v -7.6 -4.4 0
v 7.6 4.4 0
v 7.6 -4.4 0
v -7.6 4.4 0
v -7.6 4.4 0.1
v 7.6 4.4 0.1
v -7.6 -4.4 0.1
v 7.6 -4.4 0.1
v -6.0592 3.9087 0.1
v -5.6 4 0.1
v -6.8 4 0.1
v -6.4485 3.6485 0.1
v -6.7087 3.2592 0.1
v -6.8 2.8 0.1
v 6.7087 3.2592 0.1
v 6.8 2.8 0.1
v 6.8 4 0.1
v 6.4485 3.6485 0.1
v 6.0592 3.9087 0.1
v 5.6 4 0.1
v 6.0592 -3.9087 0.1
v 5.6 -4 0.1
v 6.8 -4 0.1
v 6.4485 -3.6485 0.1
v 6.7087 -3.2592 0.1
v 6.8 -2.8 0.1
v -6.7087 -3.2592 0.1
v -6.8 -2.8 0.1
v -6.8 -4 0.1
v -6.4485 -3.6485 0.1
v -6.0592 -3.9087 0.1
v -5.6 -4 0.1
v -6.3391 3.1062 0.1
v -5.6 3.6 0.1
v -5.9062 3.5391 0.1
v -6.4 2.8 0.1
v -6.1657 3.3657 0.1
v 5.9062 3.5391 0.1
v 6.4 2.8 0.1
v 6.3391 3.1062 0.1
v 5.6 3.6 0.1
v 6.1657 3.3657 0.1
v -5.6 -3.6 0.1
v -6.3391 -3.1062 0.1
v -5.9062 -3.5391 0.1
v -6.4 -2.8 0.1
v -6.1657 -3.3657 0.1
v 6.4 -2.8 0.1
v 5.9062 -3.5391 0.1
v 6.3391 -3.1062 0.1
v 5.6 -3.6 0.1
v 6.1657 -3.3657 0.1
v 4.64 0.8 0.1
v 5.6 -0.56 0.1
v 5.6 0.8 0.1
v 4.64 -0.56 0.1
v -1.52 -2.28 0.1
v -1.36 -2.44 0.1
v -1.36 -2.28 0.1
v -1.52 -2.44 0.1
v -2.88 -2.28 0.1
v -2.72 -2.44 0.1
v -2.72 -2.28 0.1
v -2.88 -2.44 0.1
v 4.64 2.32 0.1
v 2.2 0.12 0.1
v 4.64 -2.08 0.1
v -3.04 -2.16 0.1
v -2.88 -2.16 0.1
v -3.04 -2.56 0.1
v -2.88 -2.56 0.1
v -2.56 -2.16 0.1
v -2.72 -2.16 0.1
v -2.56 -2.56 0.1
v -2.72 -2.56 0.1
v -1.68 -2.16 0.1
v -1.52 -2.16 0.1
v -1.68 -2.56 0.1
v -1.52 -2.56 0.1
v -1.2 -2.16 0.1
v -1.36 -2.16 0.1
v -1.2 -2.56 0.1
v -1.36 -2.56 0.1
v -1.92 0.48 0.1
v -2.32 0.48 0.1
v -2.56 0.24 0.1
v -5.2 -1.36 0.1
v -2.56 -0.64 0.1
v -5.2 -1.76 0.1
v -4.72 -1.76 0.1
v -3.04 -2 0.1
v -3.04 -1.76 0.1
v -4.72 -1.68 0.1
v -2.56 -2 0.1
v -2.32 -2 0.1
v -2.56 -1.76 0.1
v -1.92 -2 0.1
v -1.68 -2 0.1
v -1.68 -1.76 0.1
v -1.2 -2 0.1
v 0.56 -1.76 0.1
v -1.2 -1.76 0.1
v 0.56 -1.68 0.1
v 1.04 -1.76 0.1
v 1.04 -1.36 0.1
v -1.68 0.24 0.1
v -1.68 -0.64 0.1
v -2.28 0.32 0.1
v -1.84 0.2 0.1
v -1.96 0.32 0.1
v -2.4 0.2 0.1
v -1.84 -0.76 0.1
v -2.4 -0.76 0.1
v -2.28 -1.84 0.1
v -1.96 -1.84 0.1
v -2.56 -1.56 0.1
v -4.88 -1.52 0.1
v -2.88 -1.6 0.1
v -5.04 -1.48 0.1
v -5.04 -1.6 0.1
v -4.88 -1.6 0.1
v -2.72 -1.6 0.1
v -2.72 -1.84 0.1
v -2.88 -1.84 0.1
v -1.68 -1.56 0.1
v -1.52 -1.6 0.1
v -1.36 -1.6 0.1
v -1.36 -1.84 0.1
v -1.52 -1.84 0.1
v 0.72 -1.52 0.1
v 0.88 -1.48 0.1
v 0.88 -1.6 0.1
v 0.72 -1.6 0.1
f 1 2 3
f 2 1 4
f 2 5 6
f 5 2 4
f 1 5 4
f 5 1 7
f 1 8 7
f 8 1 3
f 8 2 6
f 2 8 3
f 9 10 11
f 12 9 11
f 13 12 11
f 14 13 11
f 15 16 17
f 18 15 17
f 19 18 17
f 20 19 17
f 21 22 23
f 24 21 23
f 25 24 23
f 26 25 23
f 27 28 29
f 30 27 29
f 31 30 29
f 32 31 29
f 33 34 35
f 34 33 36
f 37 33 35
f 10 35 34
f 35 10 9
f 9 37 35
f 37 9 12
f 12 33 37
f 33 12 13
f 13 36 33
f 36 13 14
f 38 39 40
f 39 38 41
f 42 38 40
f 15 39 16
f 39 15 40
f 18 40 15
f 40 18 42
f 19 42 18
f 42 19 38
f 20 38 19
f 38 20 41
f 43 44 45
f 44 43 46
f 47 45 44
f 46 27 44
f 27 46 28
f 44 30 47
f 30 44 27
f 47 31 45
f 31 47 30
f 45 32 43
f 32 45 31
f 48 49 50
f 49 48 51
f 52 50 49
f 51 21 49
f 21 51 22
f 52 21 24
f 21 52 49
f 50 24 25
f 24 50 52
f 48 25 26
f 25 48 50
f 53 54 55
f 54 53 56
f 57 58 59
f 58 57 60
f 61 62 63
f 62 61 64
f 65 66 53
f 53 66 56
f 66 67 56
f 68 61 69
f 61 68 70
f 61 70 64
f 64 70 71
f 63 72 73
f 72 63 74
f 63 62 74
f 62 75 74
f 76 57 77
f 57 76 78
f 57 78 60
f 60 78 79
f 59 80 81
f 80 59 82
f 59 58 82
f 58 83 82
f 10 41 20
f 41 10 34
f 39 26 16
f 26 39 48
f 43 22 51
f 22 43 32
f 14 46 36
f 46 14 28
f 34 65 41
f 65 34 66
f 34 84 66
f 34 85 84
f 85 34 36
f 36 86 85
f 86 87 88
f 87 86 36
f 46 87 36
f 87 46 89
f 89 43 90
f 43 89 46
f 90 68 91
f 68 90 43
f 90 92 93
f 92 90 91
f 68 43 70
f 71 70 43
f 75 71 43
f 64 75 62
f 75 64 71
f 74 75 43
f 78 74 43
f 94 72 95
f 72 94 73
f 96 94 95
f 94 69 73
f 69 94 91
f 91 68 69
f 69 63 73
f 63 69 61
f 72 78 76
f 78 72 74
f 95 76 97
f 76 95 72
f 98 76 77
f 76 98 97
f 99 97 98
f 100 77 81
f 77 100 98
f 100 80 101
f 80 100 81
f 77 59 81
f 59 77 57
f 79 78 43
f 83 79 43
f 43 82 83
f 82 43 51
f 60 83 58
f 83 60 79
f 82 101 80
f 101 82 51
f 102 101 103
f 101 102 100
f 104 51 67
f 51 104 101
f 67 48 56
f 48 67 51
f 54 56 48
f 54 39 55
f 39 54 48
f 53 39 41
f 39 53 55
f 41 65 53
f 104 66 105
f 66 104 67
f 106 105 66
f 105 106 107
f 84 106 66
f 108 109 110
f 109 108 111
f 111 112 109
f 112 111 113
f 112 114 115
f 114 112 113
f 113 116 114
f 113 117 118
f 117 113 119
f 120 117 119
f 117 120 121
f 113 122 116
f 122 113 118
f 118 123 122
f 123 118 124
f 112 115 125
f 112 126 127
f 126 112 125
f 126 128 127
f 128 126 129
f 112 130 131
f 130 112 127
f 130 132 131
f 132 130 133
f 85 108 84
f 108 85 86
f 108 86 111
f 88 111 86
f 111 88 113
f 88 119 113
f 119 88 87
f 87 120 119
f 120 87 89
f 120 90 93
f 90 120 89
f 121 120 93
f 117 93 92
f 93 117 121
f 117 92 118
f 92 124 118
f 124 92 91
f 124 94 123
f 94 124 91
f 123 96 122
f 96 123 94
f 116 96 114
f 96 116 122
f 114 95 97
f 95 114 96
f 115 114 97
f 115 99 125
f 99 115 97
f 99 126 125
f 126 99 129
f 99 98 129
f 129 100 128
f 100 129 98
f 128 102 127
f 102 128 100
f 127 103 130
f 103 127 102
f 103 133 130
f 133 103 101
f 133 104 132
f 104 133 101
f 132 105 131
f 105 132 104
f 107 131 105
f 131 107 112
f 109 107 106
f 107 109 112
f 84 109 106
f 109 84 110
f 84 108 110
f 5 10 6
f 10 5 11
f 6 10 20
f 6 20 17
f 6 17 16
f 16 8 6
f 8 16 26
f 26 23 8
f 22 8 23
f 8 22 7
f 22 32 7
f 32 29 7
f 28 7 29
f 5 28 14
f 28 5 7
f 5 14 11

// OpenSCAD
// file: ../p/box5-12.scad
use <../lib.scad>
function ldraw_lib__box5_12() = [
// 0 Box with 5 Faces without Any Edges
// 0 Name: box5-12.dat
// 0 Author: Chris Dee [cwdee]
// 0 !LDRAW_ORG Primitive UPDATE 2009-02
// 0 !LICENSE Licensed under CC BY 2.0 and CC BY 4.0 : see CAreadme.txt
// 
// 0 BFC CERTIFY CCW
  [0,"BFC","CERTIFY"],
  [0,"BFC","CCW"],
// 
// 0 !HISTORY 2009-09-03 [PTadmin] Official Update 2009-02
// 
// 
// 4 16 1 1 1 1 1 -1 -1 1 -1 -1 1 1
  [4,16,1,1,1,1,1,-1,-1,1,-1,-1,1,1],
// 4 16 -1 0 1 1 0 1 1 1 1 -1 1 1
  [4,16,-1,0,1,1,0,1,1,1,1,-1,1,1],
// 4 16 -1 0 -1 -1 0 1 -1 1 1 -1 1 -1
  [4,16,-1,0,-1,-1,0,1,-1,1,1,-1,1,-1],
// 4 16 1 0 -1 -1 0 -1 -1 1 -1 1 1 -1
  [4,16,1,0,-1,-1,0,-1,-1,1,-1,1,1,-1],
// 4 16 1 0 1 1 0 -1 1 1 -1 1 1 1
  [4,16,1,0,1,1,0,-1,1,1,-1,1,1,1],
// 0
];
makepoly(ldraw_lib__box5_12(), line=0.2);
// file: ../p/1-4ring2.scad
use <../lib.scad>
function ldraw_lib__1_4ring2() = [
// 0 Ring  2 x 0.25
// 0 Name: 1-4ring2.dat
// 0 Author: Franklin W. Cain [fwcain]
// 0 !LDRAW_ORG Primitive UPDATE 2015-01
// 0 !LICENSE Licensed under CC BY 2.0 and CC BY 4.0 : see CAreadme.txt
// 
// 0 BFC CERTIFY CCW
  [0,"BFC","CERTIFY"],
  [0,"BFC","CCW"],
// 
// 0 !HISTORY 2001-12-31 [PTadmin] Official Update 2001-03
// 0 !HISTORY 2007-06-22 [PTadmin] Header formatted for Contributor Agreement
// 0 !HISTORY 2008-07-01 [PTadmin] Official Update 2008-01
// 0 !HISTORY 2012-02-16 [Philo] Changed to CCW
// 0 !HISTORY 2012-03-30 [PTadmin] Official Update 2012-01
// 0 !HISTORY 2014-12-25 [MMR1988] Fixed a rounding issue
// 0 !HISTORY 2015-10-11 [PTadmin] Official Update 2015-01
// 
// 
// 4 16 3 0 0 2.7717 0 1.1481 1.8478 0 0.7654 2 0 0
  [4,16,3,0,0,2.7717,0,1.1481,1.8478,0,0.7654,2,0,0],
// 4 16 2.7717 0 1.1481 2.1213 0 2.1213 1.4142 0 1.4142 1.8478 0 0.7654
  [4,16,2.7717,0,1.1481,2.1213,0,2.1213,1.4142,0,1.4142,1.8478,0,0.7654],
// 4 16 2.1213 0 2.1213 1.1481 0 2.7717 0.7654 0 1.8478 1.4142 0 1.4142
  [4,16,2.1213,0,2.1213,1.1481,0,2.7717,0.7654,0,1.8478,1.4142,0,1.4142],
// 4 16 1.1481 0 2.7717 0 0 3 0 0 2 0.7654 0 1.8478
  [4,16,1.1481,0,2.7717,0,0,3,0,0,2,0.7654,0,1.8478],
// 0 // Build by Primitive Generator 2
];
makepoly(ldraw_lib__1_4ring2(), line=0.2);
// file: ../p/1-4ndis.scad
use <../lib.scad>
function ldraw_lib__1_4ndis() = [
// 0 Disc Negative 0.25
// 0 Name: 1-4ndis.dat
// 0 Author: James Jessiman
// 0 !LDRAW_ORG Primitive UPDATE 2012-01
// 0 !LICENSE Licensed under CC BY 2.0 and CC BY 4.0 : see CAreadme.txt
// 
// 0 BFC CERTIFY CCW
  [0,"BFC","CERTIFY"],
  [0,"BFC","CCW"],
// 
// 0 !HISTORY 2002-03-23 [sbliss] Added BFC Statement
// 0 !HISTORY 2002-04-25 [PTadmin] Official Update 2002-02
// 0 !HISTORY 2007-06-22 [PTadmin] Header formatted for Contributor Agreement
// 0 !HISTORY 2008-07-01 [PTadmin] Official Update 2008-01
// 0 !HISTORY 2012-02-16 [Philo] Changed to CCW
// 0 !HISTORY 2012-03-30 [PTadmin] Official Update 2012-01
// 
// 
// 3 16 0.9239 0 0.3827 1 0 0 1 0 1
  [3,16,0.9239,0,0.3827,1,0,0,1,0,1],
// 3 16 0.7071 0 0.7071 0.9239 0 0.3827 1 0 1
  [3,16,0.7071,0,0.7071,0.9239,0,0.3827,1,0,1],
// 3 16 0.3827 0 0.9239 0.7071 0 0.7071 1 0 1
  [3,16,0.3827,0,0.9239,0.7071,0,0.7071,1,0,1],
// 3 16 0 0 1 0.3827 0 0.9239 1 0 1
  [3,16,0,0,1,0.3827,0,0.9239,1,0,1],
];
makepoly(ldraw_lib__1_4ndis(), line=0.2);
// file: ../p/1-4chrd.scad
use <../lib.scad>
function ldraw_lib__1_4chrd() = [
// 0 Chord 0.25
// 0 Name: 1-4chrd.dat
// 0 Author: Tony Hafner [hafhead]
// 0 !LDRAW_ORG Primitive UPDATE 2012-02
// 0 !LICENSE Licensed under CC BY 2.0 and CC BY 4.0 : see CAreadme.txt
// 
// 0 BFC CERTIFY CCW
  [0,"BFC","CERTIFY"],
  [0,"BFC","CCW"],
// 
// 0 !HISTORY 2004-04-22 [PTadmin] Official Update 2004-02
// 0 !HISTORY 2007-10-09 [PTadmin] Header formatted for Contributor Agreement
// 0 !HISTORY 2008-07-01 [PTadmin] Official Update 2008-01
// 0 !HISTORY 2012-08-02 [MMR1988] Re-creation with PrimGen2 and Rectifier
// 0 !HISTORY 2012-08-09 [PTadmin] Official Update 2012-02
// 
// 
// 4 16 0.9239 0 0.3827 0.3827 0 0.9239 0 0 1 1 0 0
  [4,16,0.9239,0,0.3827,0.3827,0,0.9239,0,0,1,1,0,0],
// 3 16 0.7071 0 0.7071 0.3827 0 0.9239 0.9239 0 0.3827
  [3,16,0.7071,0,0.7071,0.3827,0,0.9239,0.9239,0,0.3827],
];
makepoly(ldraw_lib__1_4chrd(), line=0.2);
// main file
use <../lib.scad>
use <../p/1-4chrd.scad>
use <../p/1-4ndis.scad>
use <../p/1-4ring2.scad>
use <../p/box5-12.scad>
function ldraw_lib__163555j() = [
// 0 Sticker  1.1 x  1.9 with Airport Direction Sign - Left
// 0 Name: 163555j.dat
// 0 Author: Takeshi Takahashi [RainbowDolphin]
// 0 !LDRAW_ORG Part UPDATE 2022-05
// 0 !LICENSE Licensed under CC BY 2.0 and CC BY 4.0 : see CAreadme.txt
// 
// 0 BFC CERTIFY CCW
  [0,"BFC","CERTIFY"],
  [0,"BFC","CCW"],
// 
// 0 !KEYWORDS Bricklink 6399stk01, Brickowl 458337, Monorail, Rebrickable 163555
// 0 !KEYWORDS set 6399, Station
// 
// 0 !HISTORY 2022-09-15 [PTadmin] Official Update 2022-05
// 
// 
// 1 16 0 -0.25 0 19 0 0 0 0.25 0 0 0 11 box5-12.dat
  [1,16,0,-0.25,0,19,0,0,0,0.25,0,0,0,11, ldraw_lib__box5_12()],
// 1 16 -14 -.25 7 0 0 -3 0 1 0 3 0 0 1-4ndis.dat
  [1,16,-14,-.25,7,0,0,-3,0,1,0,3,0,0, ldraw_lib__1_4ndis()],
// 1 16 14 -.25 7 3 0 0 0 1 0 0 0 3 1-4ndis.dat
  [1,16,14,-.25,7,3,0,0,0,1,0,0,0,3, ldraw_lib__1_4ndis()],
// 1 16 14 -.25 -7 0 0 3 0 1 0 -3 0 0 1-4ndis.dat
  [1,16,14,-.25,-7,0,0,3,0,1,0,-3,0,0, ldraw_lib__1_4ndis()],
// 1 16 -14 -.25 -7 -3 0 0 0 1 0 0 0 -3 1-4ndis.dat
  [1,16,-14,-.25,-7,-3,0,0,0,1,0,0,0,-3, ldraw_lib__1_4ndis()],
// 0 BFC NOCLIP
  [0,"BFC","NOCLIP"],
// 1 15 -14 -.25 7 0 0 -2 0 1 0 2 0 0 1-4chrd.dat
  [1,15,-14,-.25,7,0,0,-2,0,1,0,2,0,0, ldraw_lib__1_4chrd()],
// 1 0 -14 -.25 7 0 0 -1 0 1 0 1 0 0 1-4ring2.dat
  [1,0,-14,-.25,7,0,0,-1,0,1,0,1,0,0, ldraw_lib__1_4ring2()],
// 1 15 14 -.25 7 2 0 0 0 1 0 0 0 2 1-4chrd.dat
  [1,15,14,-.25,7,2,0,0,0,1,0,0,0,2, ldraw_lib__1_4chrd()],
// 1 0 14 -.25 7 1 0 0 0 1 0 0 0 1 1-4ring2.dat
  [1,0,14,-.25,7,1,0,0,0,1,0,0,0,1, ldraw_lib__1_4ring2()],
// 1 15 -14 -.25 -7 -2 0 0 0 1 0 0 0 -2 1-4chrd.dat
  [1,15,-14,-.25,-7,-2,0,0,0,1,0,0,0,-2, ldraw_lib__1_4chrd()],
// 1 0 -14 -.25 -7 -1 0 0 0 1 0 0 0 -1 1-4ring2.dat
  [1,0,-14,-.25,-7,-1,0,0,0,1,0,0,0,-1, ldraw_lib__1_4ring2()],
// 1 15 14 -.25 -7 0 0 2 0 1 0 -2 0 0 1-4chrd.dat
  [1,15,14,-.25,-7,0,0,2,0,1,0,-2,0,0, ldraw_lib__1_4chrd()],
// 1 0 14 -.25 -7 0 0 1 0 1 0 -1 0 0 1-4ring2.dat
  [1,0,14,-.25,-7,0,0,1,0,1,0,-1,0,0, ldraw_lib__1_4ring2()],
// 4 4 14 -.25 -1.4 14 -.25 2 11.6 -.25 2 11.6 -.25 -1.4
  [4,4,14,-.25,-1.4,14,-.25,2,11.6,-.25,2,11.6,-.25,-1.4],
// 4 0 -3.4 -.25 -6.1 -3.4 -.25 -5.7 -3.8 -.25 -5.7 -3.8 -.25 -6.1
  [4,0,-3.4,-.25,-6.1,-3.4,-.25,-5.7,-3.8,-.25,-5.7,-3.8,-.25,-6.1],
// 4 0 -6.8 -.25 -6.1 -6.8 -.25 -5.7 -7.2 -.25 -5.7 -7.2 -.25 -6.1
  [4,0,-6.8,-.25,-6.1,-6.8,-.25,-5.7,-7.2,-.25,-5.7,-7.2,-.25,-6.1],
// 3 4 11.6 -.25 5.8 5.5 -.25 .3 11.6 -.25 2
  [3,4,11.6,-.25,5.8,5.5,-.25,.3,11.6,-.25,2],
// 3 4 11.6 -.25 2 5.5 -.25 .3 11.6 -.25 -1.4
  [3,4,11.6,-.25,2,5.5,-.25,.3,11.6,-.25,-1.4],
// 3 4 5.5 -.25 .3 11.6 -.25 -5.2 11.6 -.25 -1.4
  [3,4,5.5,-.25,.3,11.6,-.25,-5.2,11.6,-.25,-1.4],
// 4 0 -7.2 -.25 -5.7 -7.2 -.25 -5.4 -7.6 -.25 -5.4 -7.6 -.25 -6.4
  [4,0,-7.2,-.25,-5.7,-7.2,-.25,-5.4,-7.6,-.25,-5.4,-7.6,-.25,-6.4],
// 3 0 -7.2 -.25 -5.7 -7.6 -.25 -6.4 -7.2 -.25 -6.1
  [3,0,-7.2,-.25,-5.7,-7.6,-.25,-6.4,-7.2,-.25,-6.1],
// 3 0 -7.2 -.25 -6.1 -7.6 -.25 -6.4 -7.2 -.25 -6.4
  [3,0,-7.2,-.25,-6.1,-7.6,-.25,-6.4,-7.2,-.25,-6.4],
// 4 0 -6.4 -.25 -5.4 -6.8 -.25 -5.4 -6.8 -.25 -5.7 -6.4 -.25 -6.4
  [4,0,-6.4,-.25,-5.4,-6.8,-.25,-5.4,-6.8,-.25,-5.7,-6.4,-.25,-6.4],
// 3 0 -6.8 -.25 -5.7 -6.8 -.25 -6.1 -6.4 -.25 -6.4
  [3,0,-6.8,-.25,-5.7,-6.8,-.25,-6.1,-6.4,-.25,-6.4],
// 3 0 -6.8 -.25 -6.1 -6.8 -.25 -6.4 -6.4 -.25 -6.4
  [3,0,-6.8,-.25,-6.1,-6.8,-.25,-6.4,-6.4,-.25,-6.4],
// 4 0 -3.8 -.25 -5.7 -3.8 -.25 -5.4 -4.2 -.25 -5.4 -4.2 -.25 -6.4
  [4,0,-3.8,-.25,-5.7,-3.8,-.25,-5.4,-4.2,-.25,-5.4,-4.2,-.25,-6.4],
// 3 0 -3.8 -.25 -5.7 -4.2 -.25 -6.4 -3.8 -.25 -6.1
  [3,0,-3.8,-.25,-5.7,-4.2,-.25,-6.4,-3.8,-.25,-6.1],
// 3 0 -3.8 -.25 -6.1 -4.2 -.25 -6.4 -3.8 -.25 -6.4
  [3,0,-3.8,-.25,-6.1,-4.2,-.25,-6.4,-3.8,-.25,-6.4],
// 4 0 -3 -.25 -5.4 -3.4 -.25 -5.4 -3.4 -.25 -5.7 -3 -.25 -6.4
  [4,0,-3,-.25,-5.4,-3.4,-.25,-5.4,-3.4,-.25,-5.7,-3,-.25,-6.4],
// 3 0 -3.4 -.25 -5.7 -3.4 -.25 -6.1 -3 -.25 -6.4
  [3,0,-3.4,-.25,-5.7,-3.4,-.25,-6.1,-3,-.25,-6.4],
// 3 0 -3.4 -.25 -6.1 -3.4 -.25 -6.4 -3 -.25 -6.4
  [3,0,-3.4,-.25,-6.1,-3.4,-.25,-6.4,-3,-.25,-6.4],
// 4 0 14 -.25 10 -14 -.25 10 -14 -.25 9 14 -.25 9
  [4,0,14,-.25,10,-14,-.25,10,-14,-.25,9,14,-.25,9],
// 4 0 17 -.25 7 16 -.25 7 16 -.25 -7 17 -.25 -7
  [4,0,17,-.25,7,16,-.25,7,16,-.25,-7,17,-.25,-7],
// 4 0 14 -.25 -9 -14 -.25 -9 -14 -.25 -10 14 -.25 -10
  [4,0,14,-.25,-9,-14,-.25,-9,-14,-.25,-10,14,-.25,-10],
// 4 0 -16 -.25 7 -17 -.25 7 -17 -.25 -7 -16 -.25 -7
  [4,0,-16,-.25,7,-17,-.25,7,-17,-.25,-7,-16,-.25,-7],
// 4 15 11.6 -.25 5.8 14 -.25 9 -14 -.25 9 5.5 -.25 .3
  [4,15,11.6,-.25,5.8,14,-.25,9,-14,-.25,9,5.5,-.25,.3],
// 3 15 -14 -.25 9 -4.8 -.25 1.2 5.5 -.25 .3
  [3,15,-14,-.25,9,-4.8,-.25,1.2,5.5,-.25,.3],
// 4 15 -5.8 -.25 1.2 -4.8 -.25 1.2 -14 -.25 9 -16 -.25 7
  [4,15,-5.8,-.25,1.2,-4.8,-.25,1.2,-14,-.25,9,-16,-.25,7],
// 3 15 -16 -.25 7 -6.4 -.25 .6 -5.8 -.25 1.2
  [3,15,-16,-.25,7,-6.4,-.25,.6,-5.8,-.25,1.2],
// 4 15 -6.4 -.25 -1.6 -6.4 -.25 .6 -16 -.25 7 -13 -.25 -3.4
  [4,15,-6.4,-.25,-1.6,-6.4,-.25,.6,-16,-.25,7,-13,-.25,-3.4],
// 4 15 -13 -.25 -3.4 -16 -.25 7 -16 -.25 -7 -13 -.25 -4.4
  [4,15,-13,-.25,-3.4,-16,-.25,7,-16,-.25,-7,-13,-.25,-4.4],
// 4 15 -13 -.25 -4.4 -16 -.25 -7 -14 -.25 -9 -11.8 -.25 -4.4
  [4,15,-13,-.25,-4.4,-16,-.25,-7,-14,-.25,-9,-11.8,-.25,-4.4],
// 4 15 -7.6 -.25 -5 -11.8 -.25 -4.4 -14 -.25 -9 -7.6 -.25 -5.4
  [4,15,-7.6,-.25,-5,-11.8,-.25,-4.4,-14,-.25,-9,-7.6,-.25,-5.4],
// 4 15 -11.8 -.25 -4.2 -11.8 -.25 -4.4 -7.6 -.25 -5 -7.6 -.25 -4.4
  [4,15,-11.8,-.25,-4.2,-11.8,-.25,-4.4,-7.6,-.25,-5,-7.6,-.25,-4.4],
// 3 15 -7.6 -.25 -5.4 -14 -.25 -9 -7.6 -.25 -6.4
  [3,15,-7.6,-.25,-5.4,-14,-.25,-9,-7.6,-.25,-6.4],
// 3 15 -7.2 -.25 -6.4 -7.6 -.25 -6.4 -14 -.25 -9
  [3,15,-7.2,-.25,-6.4,-7.6,-.25,-6.4,-14,-.25,-9],
// 3 15 -6.8 -.25 -6.4 -7.2 -.25 -6.4 -14 -.25 -9
  [3,15,-6.8,-.25,-6.4,-7.2,-.25,-6.4,-14,-.25,-9],
// 4 15 -7.2 -.25 -6.1 -7.2 -.25 -6.4 -6.8 -.25 -6.4 -6.8 -.25 -6.1
  [4,15,-7.2,-.25,-6.1,-7.2,-.25,-6.4,-6.8,-.25,-6.4,-6.8,-.25,-6.1],
// 3 15 -6.4 -.25 -6.4 -6.8 -.25 -6.4 -14 -.25 -9
  [3,15,-6.4,-.25,-6.4,-6.8,-.25,-6.4,-14,-.25,-9],
// 3 15 -4.2 -.25 -6.4 -6.4 -.25 -6.4 -14 -.25 -9
  [3,15,-4.2,-.25,-6.4,-6.4,-.25,-6.4,-14,-.25,-9],
// 4 15 -6.4 -.25 -5.4 -5.8 -.25 -5 -6.4 -.25 -5 -6.8 -.25 -5.4
  [4,15,-6.4,-.25,-5.4,-5.8,-.25,-5,-6.4,-.25,-5,-6.8,-.25,-5.4],
// 3 15 -6.4 -.25 -4.4 -6.4 -.25 -5 -5.8 -.25 -5
  [3,15,-6.4,-.25,-4.4,-6.4,-.25,-5,-5.8,-.25,-5],
// 4 15 -7.2 -.25 -5.4 -6.8 -.25 -5.4 -6.4 -.25 -5 -7.6 -.25 -5
  [4,15,-7.2,-.25,-5.4,-6.8,-.25,-5.4,-6.4,-.25,-5,-7.6,-.25,-5],
// 3 15 -7.6 -.25 -5 -7.6 -.25 -5.4 -7.2 -.25 -5.4
  [3,15,-7.6,-.25,-5,-7.6,-.25,-5.4,-7.2,-.25,-5.4],
// 4 15 -6.8 -.25 -5.4 -7.2 -.25 -5.4 -7.2 -.25 -5.7 -6.8 -.25 -5.7
  [4,15,-6.8,-.25,-5.4,-7.2,-.25,-5.4,-7.2,-.25,-5.7,-6.8,-.25,-5.7],
// 4 15 -6.4 -.25 -5.4 -6.4 -.25 -6.4 -4.2 -.25 -6.4 -4.2 -.25 -5.4
  [4,15,-6.4,-.25,-5.4,-6.4,-.25,-6.4,-4.2,-.25,-6.4,-4.2,-.25,-5.4],
// 4 15 -5.8 -.25 -5 -6.4 -.25 -5.4 -4.2 -.25 -5.4 -4.8 -.25 -5
  [4,15,-5.8,-.25,-5,-6.4,-.25,-5.4,-4.2,-.25,-5.4,-4.8,-.25,-5],
// 4 15 -4.2 -.25 -5 -4.8 -.25 -5 -4.2 -.25 -5.4 -3.8 -.25 -5.4
  [4,15,-4.2,-.25,-5,-4.8,-.25,-5,-4.2,-.25,-5.4,-3.8,-.25,-5.4],
// 3 15 -4.2 -.25 -4.4 -4.8 -.25 -5 -4.2 -.25 -5
  [3,15,-4.2,-.25,-4.4,-4.8,-.25,-5,-4.2,-.25,-5],
// 4 15 -4.2 -.25 -5 -3.8 -.25 -5.4 -3.4 -.25 -5.4 -3 -.25 -5
  [4,15,-4.2,-.25,-5,-3.8,-.25,-5.4,-3.4,-.25,-5.4,-3,-.25,-5],
// 4 15 -3 -.25 -5 -3.4 -.25 -5.4 -3 -.25 -5.4 1.4 -.25 -4.4
  [4,15,-3,-.25,-5,-3.4,-.25,-5.4,-3,-.25,-5.4,1.4,-.25,-4.4],
// 4 15 -3.4 -.25 -5.4 -3.8 -.25 -5.4 -3.8 -.25 -5.7 -3.4 -.25 -5.7
  [4,15,-3.4,-.25,-5.4,-3.8,-.25,-5.4,-3.8,-.25,-5.7,-3.4,-.25,-5.7],
// 3 15 -3.8 -.25 -6.4 -4.2 -.25 -6.4 -14 -.25 -9
  [3,15,-3.8,-.25,-6.4,-4.2,-.25,-6.4,-14,-.25,-9],
// 3 15 -3.4 -.25 -6.4 -3.8 -.25 -6.4 -14 -.25 -9
  [3,15,-3.4,-.25,-6.4,-3.8,-.25,-6.4,-14,-.25,-9],
// 4 15 -3 -.25 -6.4 -3.4 -.25 -6.4 -14 -.25 -9 14 -.25 -9
  [4,15,-3,-.25,-6.4,-3.4,-.25,-6.4,-14,-.25,-9,14,-.25,-9],
// 4 15 -3.8 -.25 -6.1 -3.8 -.25 -6.4 -3.4 -.25 -6.4 -3.4 -.25 -6.1
  [4,15,-3.8,-.25,-6.1,-3.8,-.25,-6.4,-3.4,-.25,-6.4,-3.4,-.25,-6.1],
// 4 15 -3 -.25 -5.4 -3 -.25 -6.4 14 -.25 -9 1.4 -.25 -4.4
  [4,15,-3,-.25,-5.4,-3,-.25,-6.4,14,-.25,-9,1.4,-.25,-4.4],
// 4 15 -3 -.25 -5 1.4 -.25 -4.4 1.4 -.25 -4.2 -3 -.25 -4.4
  [4,15,-3,-.25,-5,1.4,-.25,-4.4,1.4,-.25,-4.2,-3,-.25,-4.4],
// 4 15 2.6 -.25 -4.4 1.4 -.25 -4.4 14 -.25 -9 11.6 -.25 -5.2
  [4,15,2.6,-.25,-4.4,1.4,-.25,-4.4,14,-.25,-9,11.6,-.25,-5.2],
// 4 15 11.6 -.25 -5.2 14 -.25 -9 16 -.25 -7 11.6 -.25 -1.4
  [4,15,11.6,-.25,-5.2,14,-.25,-9,16,-.25,-7,11.6,-.25,-1.4],
// 3 15 14 -.25 -1.4 11.6 -.25 -1.4 16 -.25 -7
  [3,15,14,-.25,-1.4,11.6,-.25,-1.4,16,-.25,-7],
// 4 15 14 -.25 2 14 -.25 -1.4 16 -.25 -7 16 -.25 7
  [4,15,14,-.25,2,14,-.25,-1.4,16,-.25,-7,16,-.25,7],
// 4 15 11.6 -.25 2 14 -.25 2 16 -.25 7 14 -.25 9
  [4,15,11.6,-.25,2,14,-.25,2,16,-.25,7,14,-.25,9],
// 3 15 14 -.25 9 11.6 -.25 5.8 11.6 -.25 2
  [3,15,14,-.25,9,11.6,-.25,5.8,11.6,-.25,2],
// 4 15 2.6 -.25 -3.4 2.6 -.25 -4.4 11.6 -.25 -5.2 5.5 -.25 .3
  [4,15,2.6,-.25,-3.4,2.6,-.25,-4.4,11.6,-.25,-5.2,5.5,-.25,.3],
// 4 15 -4.2 -.25 -1.6 2.6 -.25 -3.4 5.5 -.25 .3 -4.2 -.25 .6
  [4,15,-4.2,-.25,-1.6,2.6,-.25,-3.4,5.5,-.25,.3,-4.2,-.25,.6],
// 3 15 -4.8 -.25 1.2 -4.2 -.25 .6 5.5 -.25 .3
  [3,15,-4.8,-.25,1.2,-4.2,-.25,.6,5.5,-.25,.3],
// 4 15 -4.9 -.25 .8 -5.7 -.25 .8 -6 -.25 .5 -4.6 -.25 .5
  [4,15,-4.9,-.25,.8,-5.7,-.25,.8,-6,-.25,.5,-4.6,-.25,.5],
// 4 15 -4.6 -.25 .5 -6 -.25 .5 -6 -.25 -1.9 -4.6 -.25 -1.9
  [4,15,-4.6,-.25,.5,-6,-.25,.5,-6,-.25,-1.9,-4.6,-.25,-1.9],
// 4 15 -4.6 -.25 -1.9 -6 -.25 -1.9 -5.7 -.25 -4.6 -4.9 -.25 -4.6
  [4,15,-4.6,-.25,-1.9,-6,-.25,-1.9,-5.7,-.25,-4.6,-4.9,-.25,-4.6],
// 3 15 -6 -.25 -1.9 -6.4 -.25 -3.9 -5.7 -.25 -4.6
  [3,15,-6,-.25,-1.9,-6.4,-.25,-3.9,-5.7,-.25,-4.6],
// 4 15 -12.2 -.25 -3.8 -7.2 -.25 -4 -6 -.25 -1.9 -12.6 -.25 -3.7
  [4,15,-12.2,-.25,-3.8,-7.2,-.25,-4,-6,-.25,-1.9,-12.6,-.25,-3.7],
// 4 15 -12.2 -.25 -3.8 -12.6 -.25 -3.7 -12.6 -.25 -4 -12.2 -.25 -4
  [4,15,-12.2,-.25,-3.8,-12.6,-.25,-3.7,-12.6,-.25,-4,-12.2,-.25,-4],
// 4 15 -6 -.25 -1.9 -7.2 -.25 -4 -6.8 -.25 -4 -6.4 -.25 -3.9
  [4,15,-6,-.25,-1.9,-7.2,-.25,-4,-6.8,-.25,-4,-6.4,-.25,-3.9],
// 4 15 -6.8 -.25 -4 -7.2 -.25 -4 -7.2 -.25 -4.6 -6.8 -.25 -4.6
  [4,15,-6.8,-.25,-4,-7.2,-.25,-4,-7.2,-.25,-4.6,-6.8,-.25,-4.6],
// 3 15 -4.6 -.25 -1.9 -4.9 -.25 -4.6 -4.2 -.25 -3.9
  [3,15,-4.6,-.25,-1.9,-4.9,-.25,-4.6,-4.2,-.25,-3.9],
// 4 15 -4.6 -.25 -1.9 -4.2 -.25 -3.9 -3.8 -.25 -4 -3.4 -.25 -4
  [4,15,-4.6,-.25,-1.9,-4.2,-.25,-3.9,-3.8,-.25,-4,-3.4,-.25,-4],
// 4 15 -3.4 -.25 -4 -3.8 -.25 -4 -3.8 -.25 -4.6 -3.4 -.25 -4.6
  [4,15,-3.4,-.25,-4,-3.8,-.25,-4,-3.8,-.25,-4.6,-3.4,-.25,-4.6],
// 4 15 -4.6 -.25 -1.9 -3.4 -.25 -4 1.8 -.25 -3.8 2.2 -.25 -3.7
  [4,15,-4.6,-.25,-1.9,-3.4,-.25,-4,1.8,-.25,-3.8,2.2,-.25,-3.7],
// 4 15 2.2 -.25 -3.7 1.8 -.25 -3.8 1.8 -.25 -4 2.2 -.25 -4
  [4,15,2.2,-.25,-3.7,1.8,-.25,-3.8,1.8,-.25,-4,2.2,-.25,-4],
// 4 0 -5.7 -.25 .8 -4.8 -.25 1.2 -5.8 -.25 1.2 -6.4 -.25 .6
  [4,0,-5.7,-.25,.8,-4.8,-.25,1.2,-5.8,-.25,1.2,-6.4,-.25,.6],
// 3 0 -5.7 -.25 .8 -6.4 -.25 .6 -6 -.25 .5
  [3,0,-5.7,-.25,.8,-6.4,-.25,.6,-6,-.25,.5],
// 4 0 -6 -.25 .5 -6.4 -.25 .6 -6.4 -.25 -1.6 -6 -.25 -1.9
  [4,0,-6,-.25,.5,-6.4,-.25,.6,-6.4,-.25,-1.6,-6,-.25,-1.9],
// 4 0 -12.6 -.25 -3.7 -6 -.25 -1.9 -6.4 -.25 -1.6 -13 -.25 -3.4
  [4,0,-12.6,-.25,-3.7,-6,-.25,-1.9,-6.4,-.25,-1.6,-13,-.25,-3.4],
// 4 0 -12.6 -.25 -3.7 -13 -.25 -3.4 -13 -.25 -4.4 -12.6 -.25 -4
  [4,0,-12.6,-.25,-3.7,-13,-.25,-3.4,-13,-.25,-4.4,-12.6,-.25,-4],
// 4 0 -12.6 -.25 -4 -13 -.25 -4.4 -11.8 -.25 -4.4 -11.8 -.25 -4.2
  [4,0,-12.6,-.25,-4,-13,-.25,-4.4,-11.8,-.25,-4.4,-11.8,-.25,-4.2],
// 3 0 -12.2 -.25 -4 -12.6 -.25 -4 -11.8 -.25 -4.2
  [3,0,-12.2,-.25,-4,-12.6,-.25,-4,-11.8,-.25,-4.2],
// 4 0 -12.2 -.25 -3.8 -12.2 -.25 -4 -11.8 -.25 -4.2 -7.6 -.25 -4.4
  [4,0,-12.2,-.25,-3.8,-12.2,-.25,-4,-11.8,-.25,-4.2,-7.6,-.25,-4.4],
// 3 0 -12.2 -.25 -3.8 -7.6 -.25 -4.4 -7.2 -.25 -4
  [3,0,-12.2,-.25,-3.8,-7.6,-.25,-4.4,-7.2,-.25,-4],
// 4 0 -7.2 -.25 -4.6 -7.2 -.25 -4 -7.6 -.25 -4.4 -7.6 -.25 -5
  [4,0,-7.2,-.25,-4.6,-7.2,-.25,-4,-7.6,-.25,-4.4,-7.6,-.25,-5],
// 4 0 -7.2 -.25 -4.6 -7.6 -.25 -5 -6.4 -.25 -5 -6.8 -.25 -4.6
  [4,0,-7.2,-.25,-4.6,-7.6,-.25,-5,-6.4,-.25,-5,-6.8,-.25,-4.6],
// 4 0 -6.8 -.25 -4.6 -6.4 -.25 -5 -6.4 -.25 -4.4 -6.8 -.25 -4
  [4,0,-6.8,-.25,-4.6,-6.4,-.25,-5,-6.4,-.25,-4.4,-6.8,-.25,-4],
// 4 0 -6.4 -.25 -3.9 -6.8 -.25 -4 -6.4 -.25 -4.4 -5.7 -.25 -4.6
  [4,0,-6.4,-.25,-3.9,-6.8,-.25,-4,-6.4,-.25,-4.4,-5.7,-.25,-4.6],
// 4 0 -5.7 -.25 -4.6 -6.4 -.25 -4.4 -5.8 -.25 -5 -4.8 -.25 -5
  [4,0,-5.7,-.25,-4.6,-6.4,-.25,-4.4,-5.8,-.25,-5,-4.8,-.25,-5],
// 3 0 -4.9 -.25 -4.6 -5.7 -.25 -4.6 -4.8 -.25 -5
  [3,0,-4.9,-.25,-4.6,-5.7,-.25,-4.6,-4.8,-.25,-5],
// 4 0 -4.9 -.25 -4.6 -4.8 -.25 -5 -4.2 -.25 -4.4 -4.2 -.25 -3.9
  [4,0,-4.9,-.25,-4.6,-4.8,-.25,-5,-4.2,-.25,-4.4,-4.2,-.25,-3.9],
// 4 0 -3.8 -.25 -4 -4.2 -.25 -3.9 -4.2 -.25 -4.4 -3.8 -.25 -4.6
  [4,0,-3.8,-.25,-4,-4.2,-.25,-3.9,-4.2,-.25,-4.4,-3.8,-.25,-4.6],
// 3 0 -4.2 -.25 -4.4 -4.2 -.25 -5 -3.8 -.25 -4.6
  [3,0,-4.2,-.25,-4.4,-4.2,-.25,-5,-3.8,-.25,-4.6],
// 4 0 -3.8 -.25 -4.6 -4.2 -.25 -5 -3 -.25 -5 -3.4 -.25 -4.6
  [4,0,-3.8,-.25,-4.6,-4.2,-.25,-5,-3,-.25,-5,-3.4,-.25,-4.6],
// 4 0 -3.4 -.25 -4.6 -3 -.25 -5 -3 -.25 -4.4 -3.4 -.25 -4
  [4,0,-3.4,-.25,-4.6,-3,-.25,-5,-3,-.25,-4.4,-3.4,-.25,-4],
// 4 0 -3.4 -.25 -4 -3 -.25 -4.4 1.4 -.25 -4.2 1.8 -.25 -3.8
  [4,0,-3.4,-.25,-4,-3,-.25,-4.4,1.4,-.25,-4.2,1.8,-.25,-3.8],
// 4 0 1.8 -.25 -4 1.8 -.25 -3.8 1.4 -.25 -4.2 1.4 -.25 -4.4
  [4,0,1.8,-.25,-4,1.8,-.25,-3.8,1.4,-.25,-4.2,1.4,-.25,-4.4],
// 4 0 2.2 -.25 -4 1.8 -.25 -4 1.4 -.25 -4.4 2.6 -.25 -4.4
  [4,0,2.2,-.25,-4,1.8,-.25,-4,1.4,-.25,-4.4,2.6,-.25,-4.4],
// 4 0 2.2 -.25 -4 2.6 -.25 -4.4 2.6 -.25 -3.4 2.2 -.25 -3.7
  [4,0,2.2,-.25,-4,2.6,-.25,-4.4,2.6,-.25,-3.4,2.2,-.25,-3.7],
// 4 0 2.2 -.25 -3.7 2.6 -.25 -3.4 -4.2 -.25 -1.6 -4.6 -.25 -1.9
  [4,0,2.2,-.25,-3.7,2.6,-.25,-3.4,-4.2,-.25,-1.6,-4.6,-.25,-1.9],
// 4 0 -4.6 -.25 .5 -4.6 -.25 -1.9 -4.2 -.25 -1.6 -4.2 -.25 .6
  [4,0,-4.6,-.25,.5,-4.6,-.25,-1.9,-4.2,-.25,-1.6,-4.2,-.25,.6],
// 4 0 -4.6 -.25 .5 -4.2 -.25 .6 -4.8 -.25 1.2 -4.9 -.25 .8
  [4,0,-4.6,-.25,.5,-4.2,-.25,.6,-4.8,-.25,1.2,-4.9,-.25,.8],
// 3 0 -4.8 -.25 1.2 -5.7 -.25 .8 -4.9 -.25 .8
  [3,0,-4.8,-.25,1.2,-5.7,-.25,.8,-4.9,-.25,.8],
// 0 BFC CLIP
  [0,"BFC","CLIP"],
// 4 16 -19 -.25 11 -17 -.25 10 -14 -.25 10 19 -.25 11
  [4,16,-19,-.25,11,-17,-.25,10,-14,-.25,10,19,-.25,11],
// 3 16 19 -.25 11 -14 -.25 10 14 -.25 10
  [3,16,19,-.25,11,-14,-.25,10,14,-.25,10],
// 3 16 19 -.25 11 14 -.25 10 17 -.25 10
  [3,16,19,-.25,11,14,-.25,10,17,-.25,10],
// 3 16 19 -.25 11 17 -.25 10 17 -.25 7
  [3,16,19,-.25,11,17,-.25,10,17,-.25,7],
// 4 16 19 -.25 11 17 -.25 7 17 -.25 -7 19 -.25 -11
  [4,16,19,-.25,11,17,-.25,7,17,-.25,-7,19,-.25,-11],
// 3 16 17 -.25 -7 17 -.25 -10 19 -.25 -11
  [3,16,17,-.25,-7,17,-.25,-10,19,-.25,-11],
// 4 16 19 -.25 -11 17 -.25 -10 14 -.25 -10 -19 -.25 -11
  [4,16,19,-.25,-11,17,-.25,-10,14,-.25,-10,-19,-.25,-11],
// 3 16 14 -.25 -10 -14 -.25 -10 -19 -.25 -11
  [3,16,14,-.25,-10,-14,-.25,-10,-19,-.25,-11],
// 3 16 -14 -.25 -10 -17 -.25 -10 -19 -.25 -11
  [3,16,-14,-.25,-10,-17,-.25,-10,-19,-.25,-11],
// 3 16 -17 -.25 -7 -19 -.25 -11 -17 -.25 -10
  [3,16,-17,-.25,-7,-19,-.25,-11,-17,-.25,-10],
// 4 16 -19 -.25 -11 -17 -.25 -7 -17 -.25 7 -19 -.25 11
  [4,16,-19,-.25,-11,-17,-.25,-7,-17,-.25,7,-19,-.25,11],
// 3 16 -19 -.25 11 -17 -.25 7 -17 -.25 10
  [3,16,-19,-.25,11,-17,-.25,7,-17,-.25,10],
];
makepoly(ldraw_lib__163555j(), line=0.2);
